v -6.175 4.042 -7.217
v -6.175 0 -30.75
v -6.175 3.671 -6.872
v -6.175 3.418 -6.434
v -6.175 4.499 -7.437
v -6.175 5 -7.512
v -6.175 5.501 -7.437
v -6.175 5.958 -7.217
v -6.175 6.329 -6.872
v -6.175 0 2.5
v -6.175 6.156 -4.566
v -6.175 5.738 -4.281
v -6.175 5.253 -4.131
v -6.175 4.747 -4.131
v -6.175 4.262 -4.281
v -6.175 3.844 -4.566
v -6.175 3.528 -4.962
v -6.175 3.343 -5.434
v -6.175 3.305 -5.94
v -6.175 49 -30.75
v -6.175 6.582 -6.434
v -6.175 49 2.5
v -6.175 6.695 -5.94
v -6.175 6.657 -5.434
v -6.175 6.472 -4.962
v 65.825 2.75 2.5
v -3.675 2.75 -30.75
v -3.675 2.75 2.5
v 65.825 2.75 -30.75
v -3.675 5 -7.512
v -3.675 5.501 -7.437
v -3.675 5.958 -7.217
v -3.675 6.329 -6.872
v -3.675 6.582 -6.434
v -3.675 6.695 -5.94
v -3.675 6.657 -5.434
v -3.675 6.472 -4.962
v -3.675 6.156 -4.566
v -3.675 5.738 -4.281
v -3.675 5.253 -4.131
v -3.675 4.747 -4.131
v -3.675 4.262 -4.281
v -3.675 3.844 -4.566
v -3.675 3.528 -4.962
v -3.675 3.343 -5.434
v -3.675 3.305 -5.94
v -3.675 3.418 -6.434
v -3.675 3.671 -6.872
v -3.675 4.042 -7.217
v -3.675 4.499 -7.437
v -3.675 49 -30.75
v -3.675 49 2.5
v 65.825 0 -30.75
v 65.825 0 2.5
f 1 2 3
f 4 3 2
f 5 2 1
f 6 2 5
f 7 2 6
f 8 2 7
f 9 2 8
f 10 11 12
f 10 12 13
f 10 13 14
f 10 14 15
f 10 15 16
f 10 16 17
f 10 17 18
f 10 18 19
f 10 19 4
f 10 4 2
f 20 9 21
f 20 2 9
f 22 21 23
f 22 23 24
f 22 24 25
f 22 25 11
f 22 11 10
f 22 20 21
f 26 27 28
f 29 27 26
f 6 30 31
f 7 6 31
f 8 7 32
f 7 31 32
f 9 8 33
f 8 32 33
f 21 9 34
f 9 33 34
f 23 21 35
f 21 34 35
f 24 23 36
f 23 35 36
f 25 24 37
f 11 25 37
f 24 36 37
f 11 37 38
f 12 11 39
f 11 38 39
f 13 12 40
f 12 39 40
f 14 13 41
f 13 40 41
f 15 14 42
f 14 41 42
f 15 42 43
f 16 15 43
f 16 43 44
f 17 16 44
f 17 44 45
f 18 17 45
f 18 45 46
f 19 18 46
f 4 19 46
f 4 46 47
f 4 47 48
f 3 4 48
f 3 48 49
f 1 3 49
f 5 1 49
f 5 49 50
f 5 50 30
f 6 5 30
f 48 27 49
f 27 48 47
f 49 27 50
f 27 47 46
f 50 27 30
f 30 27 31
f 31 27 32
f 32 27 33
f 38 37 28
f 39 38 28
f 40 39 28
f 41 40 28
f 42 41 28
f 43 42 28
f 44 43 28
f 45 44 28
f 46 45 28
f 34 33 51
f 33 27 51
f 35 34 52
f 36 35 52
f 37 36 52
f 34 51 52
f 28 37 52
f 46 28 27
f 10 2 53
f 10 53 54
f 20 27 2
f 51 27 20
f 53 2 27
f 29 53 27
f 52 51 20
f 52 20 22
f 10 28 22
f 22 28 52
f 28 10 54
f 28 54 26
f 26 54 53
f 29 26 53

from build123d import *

# Parameters (mm, degrees)
SKETCH1_W            = 69.5
SKETCH1_H            = 33.25
BOSS_EXTRUDE1_DEPTH  = 2.75
SKETCH2_W            = 33.25
SKETCH2_H            = 49
BOSS_EXTRUDE2_DEPTH  = 2.5
M3_CLEARANCE_HOLE1_D = 3.4


with BuildPart() as part:
    # Sketch1 → Boss-Extrude1 (new body)
    with BuildSketch(Plane(origin=(0, 0, 0), x_dir=(1, 0, 0), z_dir=(0, 1, 0))):
        with Locations((31.075, 14.125)):
            Rectangle(SKETCH1_W, SKETCH1_H)
    extrude(amount=BOSS_EXTRUDE1_DEPTH)

    # Sketch2 → Boss-Extrude2 (add)
    with BuildSketch(Plane.ZY.offset(3.675)):
        with Locations((-14.125, 24.5)):
            Rectangle(SKETCH2_W, SKETCH2_H)
    extrude(amount=BOSS_EXTRUDE2_DEPTH)

    # M3 Clearance Hole1 (through all)
    with Locations(Plane.ZY.offset(6.175)):
        with Locations((-5.8125, 5)):
            Hole(M3_CLEARANCE_HOLE1_D / 2)


solid = part.part
